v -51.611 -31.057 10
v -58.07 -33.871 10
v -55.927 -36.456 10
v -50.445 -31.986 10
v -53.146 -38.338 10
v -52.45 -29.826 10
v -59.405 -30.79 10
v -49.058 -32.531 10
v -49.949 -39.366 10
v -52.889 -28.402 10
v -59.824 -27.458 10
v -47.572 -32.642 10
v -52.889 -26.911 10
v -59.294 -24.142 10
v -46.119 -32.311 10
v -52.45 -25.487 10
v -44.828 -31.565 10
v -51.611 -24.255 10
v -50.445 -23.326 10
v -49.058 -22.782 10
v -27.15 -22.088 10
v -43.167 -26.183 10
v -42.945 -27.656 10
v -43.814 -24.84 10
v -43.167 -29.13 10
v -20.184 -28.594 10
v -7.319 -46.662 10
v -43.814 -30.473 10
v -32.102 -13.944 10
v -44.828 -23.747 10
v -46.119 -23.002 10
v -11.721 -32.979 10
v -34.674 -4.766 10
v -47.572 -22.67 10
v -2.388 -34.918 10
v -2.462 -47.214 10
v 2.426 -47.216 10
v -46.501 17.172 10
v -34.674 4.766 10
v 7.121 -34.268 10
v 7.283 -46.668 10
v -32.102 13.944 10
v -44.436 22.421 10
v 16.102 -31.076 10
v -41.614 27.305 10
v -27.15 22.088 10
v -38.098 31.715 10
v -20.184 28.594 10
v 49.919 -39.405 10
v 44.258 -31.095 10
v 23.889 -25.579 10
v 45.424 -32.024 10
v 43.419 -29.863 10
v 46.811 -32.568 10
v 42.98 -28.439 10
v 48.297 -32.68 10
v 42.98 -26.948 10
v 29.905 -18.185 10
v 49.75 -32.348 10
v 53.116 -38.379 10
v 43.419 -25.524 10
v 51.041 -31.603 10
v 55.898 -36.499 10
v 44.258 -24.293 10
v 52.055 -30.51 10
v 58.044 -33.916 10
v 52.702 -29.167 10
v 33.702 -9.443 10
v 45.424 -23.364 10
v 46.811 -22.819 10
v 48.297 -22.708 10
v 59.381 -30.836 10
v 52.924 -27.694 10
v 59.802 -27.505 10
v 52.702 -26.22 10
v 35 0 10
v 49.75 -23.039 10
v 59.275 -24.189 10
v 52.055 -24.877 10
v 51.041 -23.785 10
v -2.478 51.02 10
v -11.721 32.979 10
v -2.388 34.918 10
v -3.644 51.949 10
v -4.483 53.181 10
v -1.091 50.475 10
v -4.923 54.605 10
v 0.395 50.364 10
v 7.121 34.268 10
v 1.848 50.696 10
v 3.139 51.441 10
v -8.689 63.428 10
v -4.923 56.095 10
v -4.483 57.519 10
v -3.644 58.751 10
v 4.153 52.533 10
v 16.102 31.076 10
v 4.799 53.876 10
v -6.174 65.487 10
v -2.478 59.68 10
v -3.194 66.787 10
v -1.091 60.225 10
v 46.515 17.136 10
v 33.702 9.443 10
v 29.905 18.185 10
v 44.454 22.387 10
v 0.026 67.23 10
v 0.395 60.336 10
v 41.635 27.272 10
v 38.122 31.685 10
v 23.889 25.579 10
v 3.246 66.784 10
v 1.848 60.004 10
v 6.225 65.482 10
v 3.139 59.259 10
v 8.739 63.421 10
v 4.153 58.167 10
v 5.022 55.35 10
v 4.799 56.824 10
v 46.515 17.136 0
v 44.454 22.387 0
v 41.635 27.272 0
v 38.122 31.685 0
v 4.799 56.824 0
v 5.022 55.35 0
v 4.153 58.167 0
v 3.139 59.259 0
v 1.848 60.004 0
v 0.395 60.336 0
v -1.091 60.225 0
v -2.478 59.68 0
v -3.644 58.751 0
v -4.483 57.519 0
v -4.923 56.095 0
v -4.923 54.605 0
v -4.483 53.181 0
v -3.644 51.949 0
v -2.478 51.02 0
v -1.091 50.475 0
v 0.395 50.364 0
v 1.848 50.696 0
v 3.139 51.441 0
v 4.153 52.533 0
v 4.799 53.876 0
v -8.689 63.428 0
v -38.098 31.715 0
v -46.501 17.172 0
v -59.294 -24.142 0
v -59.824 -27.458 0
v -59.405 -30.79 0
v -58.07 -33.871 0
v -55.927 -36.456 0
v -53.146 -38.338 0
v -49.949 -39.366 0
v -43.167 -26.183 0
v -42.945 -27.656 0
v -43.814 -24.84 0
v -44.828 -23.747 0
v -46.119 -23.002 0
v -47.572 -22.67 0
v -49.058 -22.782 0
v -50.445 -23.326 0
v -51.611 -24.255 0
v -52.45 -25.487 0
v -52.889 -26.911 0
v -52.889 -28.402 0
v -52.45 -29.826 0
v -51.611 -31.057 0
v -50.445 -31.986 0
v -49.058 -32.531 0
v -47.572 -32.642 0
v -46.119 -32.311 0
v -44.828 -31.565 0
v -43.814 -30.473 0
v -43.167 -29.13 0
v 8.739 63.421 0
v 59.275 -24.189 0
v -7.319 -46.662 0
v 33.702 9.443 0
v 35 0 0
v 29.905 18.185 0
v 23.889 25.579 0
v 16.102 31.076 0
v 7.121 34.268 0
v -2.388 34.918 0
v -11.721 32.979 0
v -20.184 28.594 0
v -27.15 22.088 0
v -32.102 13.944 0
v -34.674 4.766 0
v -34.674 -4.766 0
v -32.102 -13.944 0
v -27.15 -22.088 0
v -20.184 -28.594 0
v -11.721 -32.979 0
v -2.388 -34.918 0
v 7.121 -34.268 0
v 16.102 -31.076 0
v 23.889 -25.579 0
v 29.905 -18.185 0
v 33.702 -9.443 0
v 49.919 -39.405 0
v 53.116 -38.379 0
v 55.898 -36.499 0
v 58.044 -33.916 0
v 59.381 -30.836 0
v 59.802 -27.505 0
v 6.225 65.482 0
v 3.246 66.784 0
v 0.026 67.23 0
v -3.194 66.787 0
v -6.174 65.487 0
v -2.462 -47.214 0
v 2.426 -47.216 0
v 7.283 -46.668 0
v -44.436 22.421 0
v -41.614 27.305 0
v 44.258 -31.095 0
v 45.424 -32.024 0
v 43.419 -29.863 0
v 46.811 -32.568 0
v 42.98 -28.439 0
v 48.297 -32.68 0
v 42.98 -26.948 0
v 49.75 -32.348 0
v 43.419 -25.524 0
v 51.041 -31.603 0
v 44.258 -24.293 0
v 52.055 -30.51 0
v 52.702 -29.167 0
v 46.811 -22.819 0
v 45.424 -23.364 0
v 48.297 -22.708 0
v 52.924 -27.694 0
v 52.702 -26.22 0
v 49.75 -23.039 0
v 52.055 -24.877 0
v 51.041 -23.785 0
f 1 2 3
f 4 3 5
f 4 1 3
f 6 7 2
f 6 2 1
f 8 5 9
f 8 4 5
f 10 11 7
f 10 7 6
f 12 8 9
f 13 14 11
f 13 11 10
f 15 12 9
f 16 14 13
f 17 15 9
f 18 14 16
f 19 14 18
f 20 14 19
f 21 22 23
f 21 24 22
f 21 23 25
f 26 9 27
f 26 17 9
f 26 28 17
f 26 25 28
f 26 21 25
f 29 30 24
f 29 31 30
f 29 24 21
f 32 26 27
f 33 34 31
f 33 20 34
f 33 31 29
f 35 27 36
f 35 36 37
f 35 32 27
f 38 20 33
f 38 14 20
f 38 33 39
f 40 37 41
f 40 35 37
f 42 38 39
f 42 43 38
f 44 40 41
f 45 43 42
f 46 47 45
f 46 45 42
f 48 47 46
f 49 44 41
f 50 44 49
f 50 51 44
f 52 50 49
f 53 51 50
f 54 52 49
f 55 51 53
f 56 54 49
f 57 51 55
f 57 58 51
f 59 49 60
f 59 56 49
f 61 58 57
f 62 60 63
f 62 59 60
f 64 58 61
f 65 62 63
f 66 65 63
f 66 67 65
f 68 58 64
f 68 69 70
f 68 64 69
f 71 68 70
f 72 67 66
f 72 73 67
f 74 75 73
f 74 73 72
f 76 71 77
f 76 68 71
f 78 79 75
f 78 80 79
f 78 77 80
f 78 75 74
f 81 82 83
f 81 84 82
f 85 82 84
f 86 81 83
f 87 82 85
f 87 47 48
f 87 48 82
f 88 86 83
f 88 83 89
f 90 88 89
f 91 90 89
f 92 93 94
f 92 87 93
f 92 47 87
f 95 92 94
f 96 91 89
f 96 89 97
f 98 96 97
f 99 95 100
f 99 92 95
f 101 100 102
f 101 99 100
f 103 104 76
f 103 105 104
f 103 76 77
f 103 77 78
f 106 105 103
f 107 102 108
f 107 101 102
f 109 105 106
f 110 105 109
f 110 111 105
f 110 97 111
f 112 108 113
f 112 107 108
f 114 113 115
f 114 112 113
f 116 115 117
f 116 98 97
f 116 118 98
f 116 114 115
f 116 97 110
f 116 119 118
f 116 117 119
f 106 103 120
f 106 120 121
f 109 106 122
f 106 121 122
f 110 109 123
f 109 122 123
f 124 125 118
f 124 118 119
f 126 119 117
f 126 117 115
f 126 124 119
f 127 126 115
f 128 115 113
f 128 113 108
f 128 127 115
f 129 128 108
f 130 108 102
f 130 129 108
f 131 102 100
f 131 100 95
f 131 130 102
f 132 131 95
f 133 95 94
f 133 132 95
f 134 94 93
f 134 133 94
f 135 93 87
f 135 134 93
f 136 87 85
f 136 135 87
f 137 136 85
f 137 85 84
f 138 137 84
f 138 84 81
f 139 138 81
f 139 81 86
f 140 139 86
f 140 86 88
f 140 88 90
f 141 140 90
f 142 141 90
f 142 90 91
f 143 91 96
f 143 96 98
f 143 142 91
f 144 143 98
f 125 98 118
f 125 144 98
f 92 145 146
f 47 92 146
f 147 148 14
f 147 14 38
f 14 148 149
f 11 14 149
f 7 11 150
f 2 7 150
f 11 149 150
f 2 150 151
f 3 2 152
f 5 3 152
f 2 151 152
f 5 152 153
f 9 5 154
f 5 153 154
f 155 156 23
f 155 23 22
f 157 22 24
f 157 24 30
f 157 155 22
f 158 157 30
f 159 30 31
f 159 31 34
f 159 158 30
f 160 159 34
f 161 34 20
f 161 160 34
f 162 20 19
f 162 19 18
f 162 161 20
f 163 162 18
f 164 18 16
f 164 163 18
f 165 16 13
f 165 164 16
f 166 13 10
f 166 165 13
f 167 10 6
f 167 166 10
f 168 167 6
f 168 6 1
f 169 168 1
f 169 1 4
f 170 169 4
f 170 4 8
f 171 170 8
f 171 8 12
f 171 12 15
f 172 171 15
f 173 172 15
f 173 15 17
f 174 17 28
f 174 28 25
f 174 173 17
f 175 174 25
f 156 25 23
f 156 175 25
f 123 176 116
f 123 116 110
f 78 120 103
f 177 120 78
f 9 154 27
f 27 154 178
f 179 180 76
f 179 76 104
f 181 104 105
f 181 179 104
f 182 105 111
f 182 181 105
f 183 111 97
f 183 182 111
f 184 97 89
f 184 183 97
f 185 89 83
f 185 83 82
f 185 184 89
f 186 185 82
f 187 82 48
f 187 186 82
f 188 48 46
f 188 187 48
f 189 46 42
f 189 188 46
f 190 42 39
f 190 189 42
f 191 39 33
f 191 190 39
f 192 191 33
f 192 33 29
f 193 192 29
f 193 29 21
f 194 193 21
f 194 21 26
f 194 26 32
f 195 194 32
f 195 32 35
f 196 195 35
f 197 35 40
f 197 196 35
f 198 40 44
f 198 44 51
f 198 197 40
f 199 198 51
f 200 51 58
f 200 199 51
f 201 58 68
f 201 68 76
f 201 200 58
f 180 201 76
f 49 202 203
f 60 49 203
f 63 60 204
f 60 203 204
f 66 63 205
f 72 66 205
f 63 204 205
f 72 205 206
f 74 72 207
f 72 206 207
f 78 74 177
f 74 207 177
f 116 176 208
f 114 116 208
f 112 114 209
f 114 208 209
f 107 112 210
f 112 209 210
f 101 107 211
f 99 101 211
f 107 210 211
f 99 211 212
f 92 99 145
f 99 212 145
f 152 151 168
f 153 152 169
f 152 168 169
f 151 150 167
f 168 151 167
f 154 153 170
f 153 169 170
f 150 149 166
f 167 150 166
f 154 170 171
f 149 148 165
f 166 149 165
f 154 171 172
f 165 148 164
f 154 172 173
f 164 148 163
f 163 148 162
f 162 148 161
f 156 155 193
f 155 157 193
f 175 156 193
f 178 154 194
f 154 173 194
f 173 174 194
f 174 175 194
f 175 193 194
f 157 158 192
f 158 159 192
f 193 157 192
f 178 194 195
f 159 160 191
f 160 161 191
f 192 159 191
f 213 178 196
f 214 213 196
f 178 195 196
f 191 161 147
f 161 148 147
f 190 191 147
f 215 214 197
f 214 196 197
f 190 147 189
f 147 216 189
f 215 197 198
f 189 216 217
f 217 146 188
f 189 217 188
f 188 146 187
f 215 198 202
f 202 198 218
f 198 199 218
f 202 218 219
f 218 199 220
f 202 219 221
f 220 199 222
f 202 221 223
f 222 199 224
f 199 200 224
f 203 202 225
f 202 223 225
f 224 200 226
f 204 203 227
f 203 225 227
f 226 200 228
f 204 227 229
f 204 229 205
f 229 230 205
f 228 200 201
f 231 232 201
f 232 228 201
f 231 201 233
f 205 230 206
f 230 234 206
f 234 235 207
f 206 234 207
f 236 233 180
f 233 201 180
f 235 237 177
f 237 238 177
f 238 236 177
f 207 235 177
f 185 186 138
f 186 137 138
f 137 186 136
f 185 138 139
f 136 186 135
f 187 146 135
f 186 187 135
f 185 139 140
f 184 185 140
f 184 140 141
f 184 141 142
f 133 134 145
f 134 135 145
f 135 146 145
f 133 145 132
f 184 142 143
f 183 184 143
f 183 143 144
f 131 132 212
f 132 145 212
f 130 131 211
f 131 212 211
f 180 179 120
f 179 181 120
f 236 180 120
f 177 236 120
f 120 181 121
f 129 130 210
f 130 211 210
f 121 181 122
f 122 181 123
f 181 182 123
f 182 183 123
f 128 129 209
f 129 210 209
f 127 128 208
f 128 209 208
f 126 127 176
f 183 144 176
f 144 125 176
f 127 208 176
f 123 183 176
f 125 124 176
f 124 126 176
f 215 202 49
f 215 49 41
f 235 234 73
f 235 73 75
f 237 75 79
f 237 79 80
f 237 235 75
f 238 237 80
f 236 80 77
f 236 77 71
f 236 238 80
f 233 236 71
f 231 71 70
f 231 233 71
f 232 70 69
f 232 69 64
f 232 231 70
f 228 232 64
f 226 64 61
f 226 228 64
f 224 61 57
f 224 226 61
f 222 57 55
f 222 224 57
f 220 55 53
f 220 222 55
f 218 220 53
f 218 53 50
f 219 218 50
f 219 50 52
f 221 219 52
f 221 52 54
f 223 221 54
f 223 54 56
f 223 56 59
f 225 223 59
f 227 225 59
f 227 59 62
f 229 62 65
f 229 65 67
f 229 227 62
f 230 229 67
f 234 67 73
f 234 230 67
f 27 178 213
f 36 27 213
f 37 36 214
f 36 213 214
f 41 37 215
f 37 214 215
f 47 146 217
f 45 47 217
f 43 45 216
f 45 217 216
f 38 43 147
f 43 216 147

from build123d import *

# Parameters (mm, degrees)
SKETCH_R   = 35
SKETCH_R_2 = 5
PAD_DEPTH  = 10


with BuildPart() as part:
    # Sketch → Pad (new body)
    with BuildSketch(Plane.XY):
        with BuildLine():
            ThreePointArc((8.738871, 63.421137), (0.026212, 67.229999), (-8.689414, 63.427932))
            Line((-8.689414, 63.427932), (-38.097709, 31.714926))
            ThreePointArc((-38.097709, 31.714926), (-43.116334, 24.915646), (-46.50141, 17.172386))
            Line((-59.293751, -24.142484), (-46.50141, 17.172386))
            ThreePointArc((-59.293751, -24.142484), (-58.070122, -33.870995), (-49.949432, -39.366044))
            Line((-49.949432, -39.366044), (-7.319303, -46.662246))
            ThreePointArc((-7.319303, -46.662246), (-0.018435, -47.283947), (7.282915, -46.667939))
            Line((49.918721, -39.404981), (7.282915, -46.667939))
            ThreePointArc((49.918721, -39.404981), (58.043693, -33.916265), (59.274907, -24.188712))
            Line((46.514786, 17.136121), (59.274907, -24.188712))
            ThreePointArc((46.514786, 17.136121), (43.135749, 24.882018), (38.122428, 31.685209))
            Line((8.738871, 63.421137), (38.122428, 31.685209))
        make_face()
        Circle(SKETCH_R, mode=Mode.SUBTRACT)
        with Locations((-47.945296, -27.656311)):
            Circle(SKETCH_R_2, mode=Mode.SUBTRACT)
        with Locations((47.923716, -27.693689)):
            Circle(SKETCH_R_2, mode=Mode.SUBTRACT)
        with Locations((0.02158, 55.35)):
            Circle(SKETCH_R_2, mode=Mode.SUBTRACT)
    extrude(amount=PAD_DEPTH)


solid = part.part
